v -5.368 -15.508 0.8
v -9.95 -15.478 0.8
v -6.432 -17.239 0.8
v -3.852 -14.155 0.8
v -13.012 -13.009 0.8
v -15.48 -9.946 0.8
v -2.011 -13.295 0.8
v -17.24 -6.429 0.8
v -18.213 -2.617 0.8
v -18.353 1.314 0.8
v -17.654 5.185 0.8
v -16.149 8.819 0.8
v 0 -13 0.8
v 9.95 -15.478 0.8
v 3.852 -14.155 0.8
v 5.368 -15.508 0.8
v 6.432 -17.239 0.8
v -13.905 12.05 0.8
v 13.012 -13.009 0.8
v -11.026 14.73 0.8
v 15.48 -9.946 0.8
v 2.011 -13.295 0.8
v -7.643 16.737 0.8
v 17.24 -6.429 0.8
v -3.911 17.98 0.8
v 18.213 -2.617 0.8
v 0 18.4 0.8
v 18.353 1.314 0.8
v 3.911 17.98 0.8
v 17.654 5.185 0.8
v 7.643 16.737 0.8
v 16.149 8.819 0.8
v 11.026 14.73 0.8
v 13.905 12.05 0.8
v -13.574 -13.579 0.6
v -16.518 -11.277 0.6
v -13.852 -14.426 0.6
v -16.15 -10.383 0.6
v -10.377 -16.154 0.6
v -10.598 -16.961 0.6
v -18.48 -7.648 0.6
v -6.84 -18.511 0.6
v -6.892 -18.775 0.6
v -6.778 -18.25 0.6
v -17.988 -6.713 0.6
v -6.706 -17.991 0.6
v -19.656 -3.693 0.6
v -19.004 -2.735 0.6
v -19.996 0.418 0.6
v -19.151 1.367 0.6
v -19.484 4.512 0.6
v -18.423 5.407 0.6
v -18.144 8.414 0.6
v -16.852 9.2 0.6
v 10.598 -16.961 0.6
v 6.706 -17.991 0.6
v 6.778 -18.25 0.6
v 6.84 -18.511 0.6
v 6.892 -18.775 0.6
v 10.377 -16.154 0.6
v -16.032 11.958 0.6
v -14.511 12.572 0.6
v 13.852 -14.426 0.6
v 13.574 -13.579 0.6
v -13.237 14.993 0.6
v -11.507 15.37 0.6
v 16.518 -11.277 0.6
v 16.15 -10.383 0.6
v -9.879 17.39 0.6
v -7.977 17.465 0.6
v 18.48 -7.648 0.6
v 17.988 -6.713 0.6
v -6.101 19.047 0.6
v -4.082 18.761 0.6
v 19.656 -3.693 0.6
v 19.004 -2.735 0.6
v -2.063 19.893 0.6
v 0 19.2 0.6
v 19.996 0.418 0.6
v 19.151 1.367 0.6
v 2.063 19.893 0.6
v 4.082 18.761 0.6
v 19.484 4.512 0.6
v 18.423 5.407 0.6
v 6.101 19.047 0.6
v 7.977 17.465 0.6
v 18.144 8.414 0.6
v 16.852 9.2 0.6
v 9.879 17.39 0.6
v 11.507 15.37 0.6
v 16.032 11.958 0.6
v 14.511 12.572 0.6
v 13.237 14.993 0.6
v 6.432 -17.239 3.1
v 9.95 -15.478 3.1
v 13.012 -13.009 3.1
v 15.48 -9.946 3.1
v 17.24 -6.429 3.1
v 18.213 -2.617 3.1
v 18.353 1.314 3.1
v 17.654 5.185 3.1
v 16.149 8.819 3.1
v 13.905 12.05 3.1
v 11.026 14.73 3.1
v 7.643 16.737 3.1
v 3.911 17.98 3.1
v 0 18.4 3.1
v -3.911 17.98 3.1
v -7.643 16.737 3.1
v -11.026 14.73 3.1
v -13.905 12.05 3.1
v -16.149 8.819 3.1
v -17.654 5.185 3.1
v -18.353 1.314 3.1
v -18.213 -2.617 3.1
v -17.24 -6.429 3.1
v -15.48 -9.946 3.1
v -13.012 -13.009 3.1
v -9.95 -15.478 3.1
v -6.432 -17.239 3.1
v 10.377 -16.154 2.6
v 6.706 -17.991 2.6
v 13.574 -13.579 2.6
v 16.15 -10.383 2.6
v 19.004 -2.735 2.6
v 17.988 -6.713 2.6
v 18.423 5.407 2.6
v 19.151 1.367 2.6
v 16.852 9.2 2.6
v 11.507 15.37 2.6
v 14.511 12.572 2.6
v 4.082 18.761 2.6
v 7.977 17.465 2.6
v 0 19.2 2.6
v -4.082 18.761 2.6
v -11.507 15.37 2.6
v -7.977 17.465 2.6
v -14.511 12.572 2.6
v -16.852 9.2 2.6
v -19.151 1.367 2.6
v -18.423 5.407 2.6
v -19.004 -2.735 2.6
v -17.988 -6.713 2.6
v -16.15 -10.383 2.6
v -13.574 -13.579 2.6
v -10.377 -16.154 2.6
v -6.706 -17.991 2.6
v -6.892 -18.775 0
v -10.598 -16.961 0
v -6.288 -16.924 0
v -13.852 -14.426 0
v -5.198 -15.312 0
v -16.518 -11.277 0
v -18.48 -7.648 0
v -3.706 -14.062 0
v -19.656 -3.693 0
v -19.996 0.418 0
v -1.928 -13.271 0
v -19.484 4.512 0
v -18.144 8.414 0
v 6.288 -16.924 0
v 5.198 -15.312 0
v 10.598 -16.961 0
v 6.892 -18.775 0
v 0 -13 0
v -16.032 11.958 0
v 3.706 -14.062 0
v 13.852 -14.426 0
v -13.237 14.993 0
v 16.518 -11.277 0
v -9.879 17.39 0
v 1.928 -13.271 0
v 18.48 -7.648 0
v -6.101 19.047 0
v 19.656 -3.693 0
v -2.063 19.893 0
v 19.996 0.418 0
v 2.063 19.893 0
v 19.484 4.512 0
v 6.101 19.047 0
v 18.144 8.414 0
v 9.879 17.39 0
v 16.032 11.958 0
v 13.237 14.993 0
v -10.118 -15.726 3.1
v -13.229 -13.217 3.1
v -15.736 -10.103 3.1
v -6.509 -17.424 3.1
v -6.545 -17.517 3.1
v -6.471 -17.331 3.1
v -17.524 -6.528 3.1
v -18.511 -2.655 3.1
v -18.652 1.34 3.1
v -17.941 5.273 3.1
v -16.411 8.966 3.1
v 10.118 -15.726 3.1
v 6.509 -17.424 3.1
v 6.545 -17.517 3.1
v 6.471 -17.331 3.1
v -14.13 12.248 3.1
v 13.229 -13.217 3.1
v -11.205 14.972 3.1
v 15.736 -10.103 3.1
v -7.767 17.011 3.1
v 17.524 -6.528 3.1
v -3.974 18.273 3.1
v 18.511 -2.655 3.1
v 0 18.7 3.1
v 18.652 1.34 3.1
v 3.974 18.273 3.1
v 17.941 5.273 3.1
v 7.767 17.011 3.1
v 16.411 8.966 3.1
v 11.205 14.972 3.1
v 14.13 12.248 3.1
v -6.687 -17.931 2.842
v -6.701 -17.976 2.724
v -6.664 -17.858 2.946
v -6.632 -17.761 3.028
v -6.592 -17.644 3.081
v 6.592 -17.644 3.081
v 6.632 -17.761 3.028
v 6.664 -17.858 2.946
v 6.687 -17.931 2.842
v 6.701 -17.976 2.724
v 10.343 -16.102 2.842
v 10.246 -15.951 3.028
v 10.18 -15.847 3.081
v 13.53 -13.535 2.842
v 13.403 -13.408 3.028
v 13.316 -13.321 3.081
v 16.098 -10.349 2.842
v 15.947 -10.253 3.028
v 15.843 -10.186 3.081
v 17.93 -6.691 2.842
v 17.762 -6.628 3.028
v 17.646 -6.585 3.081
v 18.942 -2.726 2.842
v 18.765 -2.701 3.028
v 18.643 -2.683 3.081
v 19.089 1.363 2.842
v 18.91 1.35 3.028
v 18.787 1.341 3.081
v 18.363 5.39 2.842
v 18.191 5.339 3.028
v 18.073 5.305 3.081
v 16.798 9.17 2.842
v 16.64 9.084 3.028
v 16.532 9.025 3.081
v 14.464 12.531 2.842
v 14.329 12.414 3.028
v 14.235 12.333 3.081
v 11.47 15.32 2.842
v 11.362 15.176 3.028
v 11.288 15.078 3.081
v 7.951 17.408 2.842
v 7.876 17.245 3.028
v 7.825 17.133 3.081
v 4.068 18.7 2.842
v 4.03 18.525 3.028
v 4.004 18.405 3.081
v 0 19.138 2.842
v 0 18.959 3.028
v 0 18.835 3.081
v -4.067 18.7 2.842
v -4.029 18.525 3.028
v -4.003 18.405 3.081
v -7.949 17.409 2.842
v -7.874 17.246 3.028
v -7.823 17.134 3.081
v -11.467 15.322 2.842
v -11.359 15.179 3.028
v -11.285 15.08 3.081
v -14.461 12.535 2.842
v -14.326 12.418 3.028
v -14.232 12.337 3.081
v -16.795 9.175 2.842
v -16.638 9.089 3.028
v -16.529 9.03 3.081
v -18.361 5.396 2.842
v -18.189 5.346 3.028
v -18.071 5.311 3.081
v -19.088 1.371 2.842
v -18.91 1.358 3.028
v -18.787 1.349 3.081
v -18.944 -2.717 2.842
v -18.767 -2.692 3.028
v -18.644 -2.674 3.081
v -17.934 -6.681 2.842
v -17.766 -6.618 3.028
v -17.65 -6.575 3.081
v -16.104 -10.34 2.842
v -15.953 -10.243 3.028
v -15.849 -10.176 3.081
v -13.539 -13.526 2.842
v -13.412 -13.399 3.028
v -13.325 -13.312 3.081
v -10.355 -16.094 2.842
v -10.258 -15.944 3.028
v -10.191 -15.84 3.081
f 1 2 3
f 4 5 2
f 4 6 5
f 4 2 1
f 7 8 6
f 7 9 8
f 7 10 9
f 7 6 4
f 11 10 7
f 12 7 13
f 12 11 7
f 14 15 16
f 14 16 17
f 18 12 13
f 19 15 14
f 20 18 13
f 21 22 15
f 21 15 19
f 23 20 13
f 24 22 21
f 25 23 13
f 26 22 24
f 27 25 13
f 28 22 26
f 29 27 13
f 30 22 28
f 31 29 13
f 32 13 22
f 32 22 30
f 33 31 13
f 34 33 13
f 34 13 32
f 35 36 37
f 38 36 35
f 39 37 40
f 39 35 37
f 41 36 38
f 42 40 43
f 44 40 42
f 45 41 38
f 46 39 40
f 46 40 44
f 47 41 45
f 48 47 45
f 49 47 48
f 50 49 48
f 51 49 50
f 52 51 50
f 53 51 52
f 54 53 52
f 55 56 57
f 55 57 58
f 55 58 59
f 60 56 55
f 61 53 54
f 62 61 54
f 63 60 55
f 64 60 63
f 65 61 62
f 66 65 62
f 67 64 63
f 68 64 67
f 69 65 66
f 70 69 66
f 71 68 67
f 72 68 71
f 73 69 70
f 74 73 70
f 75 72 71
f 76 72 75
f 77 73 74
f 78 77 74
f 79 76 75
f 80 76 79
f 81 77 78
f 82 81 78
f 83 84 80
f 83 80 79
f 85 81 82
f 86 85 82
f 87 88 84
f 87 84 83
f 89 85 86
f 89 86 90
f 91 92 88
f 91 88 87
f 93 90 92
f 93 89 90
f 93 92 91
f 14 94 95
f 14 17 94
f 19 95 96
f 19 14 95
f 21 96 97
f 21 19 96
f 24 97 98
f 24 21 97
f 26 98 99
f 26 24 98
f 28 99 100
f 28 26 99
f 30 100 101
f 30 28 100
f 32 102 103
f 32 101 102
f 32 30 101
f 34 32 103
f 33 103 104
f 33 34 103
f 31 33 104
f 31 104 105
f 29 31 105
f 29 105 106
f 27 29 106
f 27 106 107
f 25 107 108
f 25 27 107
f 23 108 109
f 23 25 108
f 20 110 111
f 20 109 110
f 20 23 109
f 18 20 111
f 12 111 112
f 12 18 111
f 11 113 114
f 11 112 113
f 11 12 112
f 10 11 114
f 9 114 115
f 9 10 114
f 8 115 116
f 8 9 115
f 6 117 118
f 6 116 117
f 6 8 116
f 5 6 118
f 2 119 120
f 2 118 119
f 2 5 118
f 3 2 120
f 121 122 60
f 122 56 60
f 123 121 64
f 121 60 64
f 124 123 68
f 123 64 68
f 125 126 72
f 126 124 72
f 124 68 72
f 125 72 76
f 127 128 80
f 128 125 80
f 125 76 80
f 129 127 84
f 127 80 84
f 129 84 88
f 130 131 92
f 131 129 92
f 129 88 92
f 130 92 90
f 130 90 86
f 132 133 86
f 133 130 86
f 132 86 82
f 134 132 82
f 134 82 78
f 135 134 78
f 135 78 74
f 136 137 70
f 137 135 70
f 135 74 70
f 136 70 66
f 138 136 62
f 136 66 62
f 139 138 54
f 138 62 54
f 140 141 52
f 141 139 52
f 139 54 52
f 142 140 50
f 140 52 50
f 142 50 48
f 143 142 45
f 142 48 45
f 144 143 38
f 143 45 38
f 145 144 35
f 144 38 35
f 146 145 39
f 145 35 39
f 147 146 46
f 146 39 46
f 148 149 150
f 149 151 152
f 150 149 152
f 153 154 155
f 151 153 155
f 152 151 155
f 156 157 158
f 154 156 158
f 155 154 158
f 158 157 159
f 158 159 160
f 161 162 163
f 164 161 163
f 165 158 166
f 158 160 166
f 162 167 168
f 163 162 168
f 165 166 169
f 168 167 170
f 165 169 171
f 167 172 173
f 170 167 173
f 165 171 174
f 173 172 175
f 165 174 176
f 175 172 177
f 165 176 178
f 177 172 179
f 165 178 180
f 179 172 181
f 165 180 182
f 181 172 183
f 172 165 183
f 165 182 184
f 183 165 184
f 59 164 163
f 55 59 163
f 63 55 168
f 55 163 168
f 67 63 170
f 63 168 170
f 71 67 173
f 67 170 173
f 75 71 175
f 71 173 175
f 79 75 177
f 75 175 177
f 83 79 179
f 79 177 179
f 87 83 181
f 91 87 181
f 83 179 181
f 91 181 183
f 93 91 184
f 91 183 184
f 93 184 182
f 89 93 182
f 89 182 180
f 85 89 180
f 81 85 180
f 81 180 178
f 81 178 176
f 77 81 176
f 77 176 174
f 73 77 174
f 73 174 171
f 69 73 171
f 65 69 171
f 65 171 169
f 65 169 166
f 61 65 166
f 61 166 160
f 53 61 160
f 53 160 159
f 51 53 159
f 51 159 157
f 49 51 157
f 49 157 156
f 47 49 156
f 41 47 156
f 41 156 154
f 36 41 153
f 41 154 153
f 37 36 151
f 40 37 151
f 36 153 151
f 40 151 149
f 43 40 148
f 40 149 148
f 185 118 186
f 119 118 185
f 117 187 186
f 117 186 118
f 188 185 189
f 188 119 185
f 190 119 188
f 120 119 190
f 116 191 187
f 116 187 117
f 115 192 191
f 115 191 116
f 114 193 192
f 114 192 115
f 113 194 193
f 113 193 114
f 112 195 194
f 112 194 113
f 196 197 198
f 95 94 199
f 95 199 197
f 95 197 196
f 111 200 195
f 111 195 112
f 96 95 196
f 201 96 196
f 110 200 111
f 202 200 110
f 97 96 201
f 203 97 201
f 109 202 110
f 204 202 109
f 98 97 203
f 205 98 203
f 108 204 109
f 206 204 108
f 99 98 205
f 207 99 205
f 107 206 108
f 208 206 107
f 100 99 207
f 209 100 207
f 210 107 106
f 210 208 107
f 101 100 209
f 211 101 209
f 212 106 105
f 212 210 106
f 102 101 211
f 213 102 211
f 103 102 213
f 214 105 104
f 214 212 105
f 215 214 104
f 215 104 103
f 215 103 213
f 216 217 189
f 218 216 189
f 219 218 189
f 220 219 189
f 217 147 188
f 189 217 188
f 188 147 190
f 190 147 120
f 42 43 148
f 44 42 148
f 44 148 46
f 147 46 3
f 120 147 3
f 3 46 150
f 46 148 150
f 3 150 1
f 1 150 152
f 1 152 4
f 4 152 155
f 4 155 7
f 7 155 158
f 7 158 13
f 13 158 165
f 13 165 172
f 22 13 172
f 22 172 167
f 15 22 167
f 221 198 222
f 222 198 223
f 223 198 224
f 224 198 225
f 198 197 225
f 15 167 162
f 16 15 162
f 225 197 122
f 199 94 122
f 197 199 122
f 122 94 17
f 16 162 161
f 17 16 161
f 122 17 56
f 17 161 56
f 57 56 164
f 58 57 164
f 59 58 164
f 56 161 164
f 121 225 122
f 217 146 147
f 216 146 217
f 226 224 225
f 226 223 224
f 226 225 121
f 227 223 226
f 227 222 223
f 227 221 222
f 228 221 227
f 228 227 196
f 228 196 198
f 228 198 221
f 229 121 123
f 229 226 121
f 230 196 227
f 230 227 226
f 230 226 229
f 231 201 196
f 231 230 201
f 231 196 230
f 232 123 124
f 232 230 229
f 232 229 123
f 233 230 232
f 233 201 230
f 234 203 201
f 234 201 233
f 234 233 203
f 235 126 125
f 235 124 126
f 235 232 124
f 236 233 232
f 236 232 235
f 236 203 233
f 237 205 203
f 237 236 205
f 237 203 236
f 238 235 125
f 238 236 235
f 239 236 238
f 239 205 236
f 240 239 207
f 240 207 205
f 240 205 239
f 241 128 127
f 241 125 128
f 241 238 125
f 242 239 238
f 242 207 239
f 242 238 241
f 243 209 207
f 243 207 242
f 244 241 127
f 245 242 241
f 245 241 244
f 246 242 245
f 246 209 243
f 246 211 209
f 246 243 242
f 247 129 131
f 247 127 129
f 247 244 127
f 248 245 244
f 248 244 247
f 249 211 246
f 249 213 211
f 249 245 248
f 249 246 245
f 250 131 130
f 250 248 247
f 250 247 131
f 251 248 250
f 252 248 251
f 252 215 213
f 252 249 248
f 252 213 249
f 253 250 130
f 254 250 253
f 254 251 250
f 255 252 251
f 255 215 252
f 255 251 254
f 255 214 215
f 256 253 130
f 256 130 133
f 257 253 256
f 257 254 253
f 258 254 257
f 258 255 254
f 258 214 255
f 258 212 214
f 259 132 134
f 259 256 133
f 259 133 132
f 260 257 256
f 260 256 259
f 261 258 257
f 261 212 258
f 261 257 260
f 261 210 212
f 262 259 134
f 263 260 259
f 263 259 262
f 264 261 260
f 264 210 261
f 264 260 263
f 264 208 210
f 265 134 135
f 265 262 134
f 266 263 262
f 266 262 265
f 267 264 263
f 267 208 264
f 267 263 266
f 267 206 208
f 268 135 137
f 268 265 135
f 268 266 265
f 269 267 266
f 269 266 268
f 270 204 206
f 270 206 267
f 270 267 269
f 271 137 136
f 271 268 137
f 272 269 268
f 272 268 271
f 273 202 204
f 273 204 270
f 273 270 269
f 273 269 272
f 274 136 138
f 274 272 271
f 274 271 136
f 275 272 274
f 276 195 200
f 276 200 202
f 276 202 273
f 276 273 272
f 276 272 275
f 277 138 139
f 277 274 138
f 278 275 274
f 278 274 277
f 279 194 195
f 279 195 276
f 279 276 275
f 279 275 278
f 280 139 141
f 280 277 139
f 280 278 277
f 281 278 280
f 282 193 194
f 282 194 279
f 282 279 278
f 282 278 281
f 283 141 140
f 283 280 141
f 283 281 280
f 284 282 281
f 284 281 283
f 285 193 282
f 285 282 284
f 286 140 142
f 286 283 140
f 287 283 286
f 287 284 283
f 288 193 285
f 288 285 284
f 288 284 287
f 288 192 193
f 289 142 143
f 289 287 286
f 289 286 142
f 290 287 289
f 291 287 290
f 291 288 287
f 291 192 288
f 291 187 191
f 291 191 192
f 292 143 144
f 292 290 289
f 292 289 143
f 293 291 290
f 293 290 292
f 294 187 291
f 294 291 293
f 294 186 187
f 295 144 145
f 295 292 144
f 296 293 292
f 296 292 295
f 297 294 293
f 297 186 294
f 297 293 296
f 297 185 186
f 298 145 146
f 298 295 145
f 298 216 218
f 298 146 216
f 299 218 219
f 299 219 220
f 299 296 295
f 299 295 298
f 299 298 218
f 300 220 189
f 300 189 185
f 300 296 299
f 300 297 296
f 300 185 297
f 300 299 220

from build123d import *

# Parameters (mm, degrees)
F0_R     = 20
F1_DEPTH = 0.6
F3_R     = 19.2
F4_DEPTH = 2.5
F5_T     = -0.8
F6_R     = 0.5
F9_D     = 14
F9_DEPTH = 4


with BuildPart() as f1:
    # F0 (on Top) → F1 (new body)
    with BuildSketch(Plane.XY):
        Circle(F0_R)
    extrude(amount=F1_DEPTH)

    # F3 (on face) → F4 (join)
    with BuildSketch(Plane.XY.offset(0.6)):
        Circle(F3_R)
    extrude(amount=F4_DEPTH)

    # F5
    f5_openings = [f1.faces().sort_by_distance(p)[0] for p in [
        (0, 0, 3.1),
    ]]
    offset(amount=F5_T, openings=f5_openings)

    # F6
    f6_edges = [f1.edges().sort_by_distance(p)[0] for p in [
        (-19.2, 0, 3.1),
    ]]
    fillet(f6_edges, radius=F6_R)

    # F9
    with Locations(Plane.XY.offset(3.1)):
        with Locations((0, -20)):
            Hole(F9_D / 2, depth=F9_DEPTH)


solid = f1.part
